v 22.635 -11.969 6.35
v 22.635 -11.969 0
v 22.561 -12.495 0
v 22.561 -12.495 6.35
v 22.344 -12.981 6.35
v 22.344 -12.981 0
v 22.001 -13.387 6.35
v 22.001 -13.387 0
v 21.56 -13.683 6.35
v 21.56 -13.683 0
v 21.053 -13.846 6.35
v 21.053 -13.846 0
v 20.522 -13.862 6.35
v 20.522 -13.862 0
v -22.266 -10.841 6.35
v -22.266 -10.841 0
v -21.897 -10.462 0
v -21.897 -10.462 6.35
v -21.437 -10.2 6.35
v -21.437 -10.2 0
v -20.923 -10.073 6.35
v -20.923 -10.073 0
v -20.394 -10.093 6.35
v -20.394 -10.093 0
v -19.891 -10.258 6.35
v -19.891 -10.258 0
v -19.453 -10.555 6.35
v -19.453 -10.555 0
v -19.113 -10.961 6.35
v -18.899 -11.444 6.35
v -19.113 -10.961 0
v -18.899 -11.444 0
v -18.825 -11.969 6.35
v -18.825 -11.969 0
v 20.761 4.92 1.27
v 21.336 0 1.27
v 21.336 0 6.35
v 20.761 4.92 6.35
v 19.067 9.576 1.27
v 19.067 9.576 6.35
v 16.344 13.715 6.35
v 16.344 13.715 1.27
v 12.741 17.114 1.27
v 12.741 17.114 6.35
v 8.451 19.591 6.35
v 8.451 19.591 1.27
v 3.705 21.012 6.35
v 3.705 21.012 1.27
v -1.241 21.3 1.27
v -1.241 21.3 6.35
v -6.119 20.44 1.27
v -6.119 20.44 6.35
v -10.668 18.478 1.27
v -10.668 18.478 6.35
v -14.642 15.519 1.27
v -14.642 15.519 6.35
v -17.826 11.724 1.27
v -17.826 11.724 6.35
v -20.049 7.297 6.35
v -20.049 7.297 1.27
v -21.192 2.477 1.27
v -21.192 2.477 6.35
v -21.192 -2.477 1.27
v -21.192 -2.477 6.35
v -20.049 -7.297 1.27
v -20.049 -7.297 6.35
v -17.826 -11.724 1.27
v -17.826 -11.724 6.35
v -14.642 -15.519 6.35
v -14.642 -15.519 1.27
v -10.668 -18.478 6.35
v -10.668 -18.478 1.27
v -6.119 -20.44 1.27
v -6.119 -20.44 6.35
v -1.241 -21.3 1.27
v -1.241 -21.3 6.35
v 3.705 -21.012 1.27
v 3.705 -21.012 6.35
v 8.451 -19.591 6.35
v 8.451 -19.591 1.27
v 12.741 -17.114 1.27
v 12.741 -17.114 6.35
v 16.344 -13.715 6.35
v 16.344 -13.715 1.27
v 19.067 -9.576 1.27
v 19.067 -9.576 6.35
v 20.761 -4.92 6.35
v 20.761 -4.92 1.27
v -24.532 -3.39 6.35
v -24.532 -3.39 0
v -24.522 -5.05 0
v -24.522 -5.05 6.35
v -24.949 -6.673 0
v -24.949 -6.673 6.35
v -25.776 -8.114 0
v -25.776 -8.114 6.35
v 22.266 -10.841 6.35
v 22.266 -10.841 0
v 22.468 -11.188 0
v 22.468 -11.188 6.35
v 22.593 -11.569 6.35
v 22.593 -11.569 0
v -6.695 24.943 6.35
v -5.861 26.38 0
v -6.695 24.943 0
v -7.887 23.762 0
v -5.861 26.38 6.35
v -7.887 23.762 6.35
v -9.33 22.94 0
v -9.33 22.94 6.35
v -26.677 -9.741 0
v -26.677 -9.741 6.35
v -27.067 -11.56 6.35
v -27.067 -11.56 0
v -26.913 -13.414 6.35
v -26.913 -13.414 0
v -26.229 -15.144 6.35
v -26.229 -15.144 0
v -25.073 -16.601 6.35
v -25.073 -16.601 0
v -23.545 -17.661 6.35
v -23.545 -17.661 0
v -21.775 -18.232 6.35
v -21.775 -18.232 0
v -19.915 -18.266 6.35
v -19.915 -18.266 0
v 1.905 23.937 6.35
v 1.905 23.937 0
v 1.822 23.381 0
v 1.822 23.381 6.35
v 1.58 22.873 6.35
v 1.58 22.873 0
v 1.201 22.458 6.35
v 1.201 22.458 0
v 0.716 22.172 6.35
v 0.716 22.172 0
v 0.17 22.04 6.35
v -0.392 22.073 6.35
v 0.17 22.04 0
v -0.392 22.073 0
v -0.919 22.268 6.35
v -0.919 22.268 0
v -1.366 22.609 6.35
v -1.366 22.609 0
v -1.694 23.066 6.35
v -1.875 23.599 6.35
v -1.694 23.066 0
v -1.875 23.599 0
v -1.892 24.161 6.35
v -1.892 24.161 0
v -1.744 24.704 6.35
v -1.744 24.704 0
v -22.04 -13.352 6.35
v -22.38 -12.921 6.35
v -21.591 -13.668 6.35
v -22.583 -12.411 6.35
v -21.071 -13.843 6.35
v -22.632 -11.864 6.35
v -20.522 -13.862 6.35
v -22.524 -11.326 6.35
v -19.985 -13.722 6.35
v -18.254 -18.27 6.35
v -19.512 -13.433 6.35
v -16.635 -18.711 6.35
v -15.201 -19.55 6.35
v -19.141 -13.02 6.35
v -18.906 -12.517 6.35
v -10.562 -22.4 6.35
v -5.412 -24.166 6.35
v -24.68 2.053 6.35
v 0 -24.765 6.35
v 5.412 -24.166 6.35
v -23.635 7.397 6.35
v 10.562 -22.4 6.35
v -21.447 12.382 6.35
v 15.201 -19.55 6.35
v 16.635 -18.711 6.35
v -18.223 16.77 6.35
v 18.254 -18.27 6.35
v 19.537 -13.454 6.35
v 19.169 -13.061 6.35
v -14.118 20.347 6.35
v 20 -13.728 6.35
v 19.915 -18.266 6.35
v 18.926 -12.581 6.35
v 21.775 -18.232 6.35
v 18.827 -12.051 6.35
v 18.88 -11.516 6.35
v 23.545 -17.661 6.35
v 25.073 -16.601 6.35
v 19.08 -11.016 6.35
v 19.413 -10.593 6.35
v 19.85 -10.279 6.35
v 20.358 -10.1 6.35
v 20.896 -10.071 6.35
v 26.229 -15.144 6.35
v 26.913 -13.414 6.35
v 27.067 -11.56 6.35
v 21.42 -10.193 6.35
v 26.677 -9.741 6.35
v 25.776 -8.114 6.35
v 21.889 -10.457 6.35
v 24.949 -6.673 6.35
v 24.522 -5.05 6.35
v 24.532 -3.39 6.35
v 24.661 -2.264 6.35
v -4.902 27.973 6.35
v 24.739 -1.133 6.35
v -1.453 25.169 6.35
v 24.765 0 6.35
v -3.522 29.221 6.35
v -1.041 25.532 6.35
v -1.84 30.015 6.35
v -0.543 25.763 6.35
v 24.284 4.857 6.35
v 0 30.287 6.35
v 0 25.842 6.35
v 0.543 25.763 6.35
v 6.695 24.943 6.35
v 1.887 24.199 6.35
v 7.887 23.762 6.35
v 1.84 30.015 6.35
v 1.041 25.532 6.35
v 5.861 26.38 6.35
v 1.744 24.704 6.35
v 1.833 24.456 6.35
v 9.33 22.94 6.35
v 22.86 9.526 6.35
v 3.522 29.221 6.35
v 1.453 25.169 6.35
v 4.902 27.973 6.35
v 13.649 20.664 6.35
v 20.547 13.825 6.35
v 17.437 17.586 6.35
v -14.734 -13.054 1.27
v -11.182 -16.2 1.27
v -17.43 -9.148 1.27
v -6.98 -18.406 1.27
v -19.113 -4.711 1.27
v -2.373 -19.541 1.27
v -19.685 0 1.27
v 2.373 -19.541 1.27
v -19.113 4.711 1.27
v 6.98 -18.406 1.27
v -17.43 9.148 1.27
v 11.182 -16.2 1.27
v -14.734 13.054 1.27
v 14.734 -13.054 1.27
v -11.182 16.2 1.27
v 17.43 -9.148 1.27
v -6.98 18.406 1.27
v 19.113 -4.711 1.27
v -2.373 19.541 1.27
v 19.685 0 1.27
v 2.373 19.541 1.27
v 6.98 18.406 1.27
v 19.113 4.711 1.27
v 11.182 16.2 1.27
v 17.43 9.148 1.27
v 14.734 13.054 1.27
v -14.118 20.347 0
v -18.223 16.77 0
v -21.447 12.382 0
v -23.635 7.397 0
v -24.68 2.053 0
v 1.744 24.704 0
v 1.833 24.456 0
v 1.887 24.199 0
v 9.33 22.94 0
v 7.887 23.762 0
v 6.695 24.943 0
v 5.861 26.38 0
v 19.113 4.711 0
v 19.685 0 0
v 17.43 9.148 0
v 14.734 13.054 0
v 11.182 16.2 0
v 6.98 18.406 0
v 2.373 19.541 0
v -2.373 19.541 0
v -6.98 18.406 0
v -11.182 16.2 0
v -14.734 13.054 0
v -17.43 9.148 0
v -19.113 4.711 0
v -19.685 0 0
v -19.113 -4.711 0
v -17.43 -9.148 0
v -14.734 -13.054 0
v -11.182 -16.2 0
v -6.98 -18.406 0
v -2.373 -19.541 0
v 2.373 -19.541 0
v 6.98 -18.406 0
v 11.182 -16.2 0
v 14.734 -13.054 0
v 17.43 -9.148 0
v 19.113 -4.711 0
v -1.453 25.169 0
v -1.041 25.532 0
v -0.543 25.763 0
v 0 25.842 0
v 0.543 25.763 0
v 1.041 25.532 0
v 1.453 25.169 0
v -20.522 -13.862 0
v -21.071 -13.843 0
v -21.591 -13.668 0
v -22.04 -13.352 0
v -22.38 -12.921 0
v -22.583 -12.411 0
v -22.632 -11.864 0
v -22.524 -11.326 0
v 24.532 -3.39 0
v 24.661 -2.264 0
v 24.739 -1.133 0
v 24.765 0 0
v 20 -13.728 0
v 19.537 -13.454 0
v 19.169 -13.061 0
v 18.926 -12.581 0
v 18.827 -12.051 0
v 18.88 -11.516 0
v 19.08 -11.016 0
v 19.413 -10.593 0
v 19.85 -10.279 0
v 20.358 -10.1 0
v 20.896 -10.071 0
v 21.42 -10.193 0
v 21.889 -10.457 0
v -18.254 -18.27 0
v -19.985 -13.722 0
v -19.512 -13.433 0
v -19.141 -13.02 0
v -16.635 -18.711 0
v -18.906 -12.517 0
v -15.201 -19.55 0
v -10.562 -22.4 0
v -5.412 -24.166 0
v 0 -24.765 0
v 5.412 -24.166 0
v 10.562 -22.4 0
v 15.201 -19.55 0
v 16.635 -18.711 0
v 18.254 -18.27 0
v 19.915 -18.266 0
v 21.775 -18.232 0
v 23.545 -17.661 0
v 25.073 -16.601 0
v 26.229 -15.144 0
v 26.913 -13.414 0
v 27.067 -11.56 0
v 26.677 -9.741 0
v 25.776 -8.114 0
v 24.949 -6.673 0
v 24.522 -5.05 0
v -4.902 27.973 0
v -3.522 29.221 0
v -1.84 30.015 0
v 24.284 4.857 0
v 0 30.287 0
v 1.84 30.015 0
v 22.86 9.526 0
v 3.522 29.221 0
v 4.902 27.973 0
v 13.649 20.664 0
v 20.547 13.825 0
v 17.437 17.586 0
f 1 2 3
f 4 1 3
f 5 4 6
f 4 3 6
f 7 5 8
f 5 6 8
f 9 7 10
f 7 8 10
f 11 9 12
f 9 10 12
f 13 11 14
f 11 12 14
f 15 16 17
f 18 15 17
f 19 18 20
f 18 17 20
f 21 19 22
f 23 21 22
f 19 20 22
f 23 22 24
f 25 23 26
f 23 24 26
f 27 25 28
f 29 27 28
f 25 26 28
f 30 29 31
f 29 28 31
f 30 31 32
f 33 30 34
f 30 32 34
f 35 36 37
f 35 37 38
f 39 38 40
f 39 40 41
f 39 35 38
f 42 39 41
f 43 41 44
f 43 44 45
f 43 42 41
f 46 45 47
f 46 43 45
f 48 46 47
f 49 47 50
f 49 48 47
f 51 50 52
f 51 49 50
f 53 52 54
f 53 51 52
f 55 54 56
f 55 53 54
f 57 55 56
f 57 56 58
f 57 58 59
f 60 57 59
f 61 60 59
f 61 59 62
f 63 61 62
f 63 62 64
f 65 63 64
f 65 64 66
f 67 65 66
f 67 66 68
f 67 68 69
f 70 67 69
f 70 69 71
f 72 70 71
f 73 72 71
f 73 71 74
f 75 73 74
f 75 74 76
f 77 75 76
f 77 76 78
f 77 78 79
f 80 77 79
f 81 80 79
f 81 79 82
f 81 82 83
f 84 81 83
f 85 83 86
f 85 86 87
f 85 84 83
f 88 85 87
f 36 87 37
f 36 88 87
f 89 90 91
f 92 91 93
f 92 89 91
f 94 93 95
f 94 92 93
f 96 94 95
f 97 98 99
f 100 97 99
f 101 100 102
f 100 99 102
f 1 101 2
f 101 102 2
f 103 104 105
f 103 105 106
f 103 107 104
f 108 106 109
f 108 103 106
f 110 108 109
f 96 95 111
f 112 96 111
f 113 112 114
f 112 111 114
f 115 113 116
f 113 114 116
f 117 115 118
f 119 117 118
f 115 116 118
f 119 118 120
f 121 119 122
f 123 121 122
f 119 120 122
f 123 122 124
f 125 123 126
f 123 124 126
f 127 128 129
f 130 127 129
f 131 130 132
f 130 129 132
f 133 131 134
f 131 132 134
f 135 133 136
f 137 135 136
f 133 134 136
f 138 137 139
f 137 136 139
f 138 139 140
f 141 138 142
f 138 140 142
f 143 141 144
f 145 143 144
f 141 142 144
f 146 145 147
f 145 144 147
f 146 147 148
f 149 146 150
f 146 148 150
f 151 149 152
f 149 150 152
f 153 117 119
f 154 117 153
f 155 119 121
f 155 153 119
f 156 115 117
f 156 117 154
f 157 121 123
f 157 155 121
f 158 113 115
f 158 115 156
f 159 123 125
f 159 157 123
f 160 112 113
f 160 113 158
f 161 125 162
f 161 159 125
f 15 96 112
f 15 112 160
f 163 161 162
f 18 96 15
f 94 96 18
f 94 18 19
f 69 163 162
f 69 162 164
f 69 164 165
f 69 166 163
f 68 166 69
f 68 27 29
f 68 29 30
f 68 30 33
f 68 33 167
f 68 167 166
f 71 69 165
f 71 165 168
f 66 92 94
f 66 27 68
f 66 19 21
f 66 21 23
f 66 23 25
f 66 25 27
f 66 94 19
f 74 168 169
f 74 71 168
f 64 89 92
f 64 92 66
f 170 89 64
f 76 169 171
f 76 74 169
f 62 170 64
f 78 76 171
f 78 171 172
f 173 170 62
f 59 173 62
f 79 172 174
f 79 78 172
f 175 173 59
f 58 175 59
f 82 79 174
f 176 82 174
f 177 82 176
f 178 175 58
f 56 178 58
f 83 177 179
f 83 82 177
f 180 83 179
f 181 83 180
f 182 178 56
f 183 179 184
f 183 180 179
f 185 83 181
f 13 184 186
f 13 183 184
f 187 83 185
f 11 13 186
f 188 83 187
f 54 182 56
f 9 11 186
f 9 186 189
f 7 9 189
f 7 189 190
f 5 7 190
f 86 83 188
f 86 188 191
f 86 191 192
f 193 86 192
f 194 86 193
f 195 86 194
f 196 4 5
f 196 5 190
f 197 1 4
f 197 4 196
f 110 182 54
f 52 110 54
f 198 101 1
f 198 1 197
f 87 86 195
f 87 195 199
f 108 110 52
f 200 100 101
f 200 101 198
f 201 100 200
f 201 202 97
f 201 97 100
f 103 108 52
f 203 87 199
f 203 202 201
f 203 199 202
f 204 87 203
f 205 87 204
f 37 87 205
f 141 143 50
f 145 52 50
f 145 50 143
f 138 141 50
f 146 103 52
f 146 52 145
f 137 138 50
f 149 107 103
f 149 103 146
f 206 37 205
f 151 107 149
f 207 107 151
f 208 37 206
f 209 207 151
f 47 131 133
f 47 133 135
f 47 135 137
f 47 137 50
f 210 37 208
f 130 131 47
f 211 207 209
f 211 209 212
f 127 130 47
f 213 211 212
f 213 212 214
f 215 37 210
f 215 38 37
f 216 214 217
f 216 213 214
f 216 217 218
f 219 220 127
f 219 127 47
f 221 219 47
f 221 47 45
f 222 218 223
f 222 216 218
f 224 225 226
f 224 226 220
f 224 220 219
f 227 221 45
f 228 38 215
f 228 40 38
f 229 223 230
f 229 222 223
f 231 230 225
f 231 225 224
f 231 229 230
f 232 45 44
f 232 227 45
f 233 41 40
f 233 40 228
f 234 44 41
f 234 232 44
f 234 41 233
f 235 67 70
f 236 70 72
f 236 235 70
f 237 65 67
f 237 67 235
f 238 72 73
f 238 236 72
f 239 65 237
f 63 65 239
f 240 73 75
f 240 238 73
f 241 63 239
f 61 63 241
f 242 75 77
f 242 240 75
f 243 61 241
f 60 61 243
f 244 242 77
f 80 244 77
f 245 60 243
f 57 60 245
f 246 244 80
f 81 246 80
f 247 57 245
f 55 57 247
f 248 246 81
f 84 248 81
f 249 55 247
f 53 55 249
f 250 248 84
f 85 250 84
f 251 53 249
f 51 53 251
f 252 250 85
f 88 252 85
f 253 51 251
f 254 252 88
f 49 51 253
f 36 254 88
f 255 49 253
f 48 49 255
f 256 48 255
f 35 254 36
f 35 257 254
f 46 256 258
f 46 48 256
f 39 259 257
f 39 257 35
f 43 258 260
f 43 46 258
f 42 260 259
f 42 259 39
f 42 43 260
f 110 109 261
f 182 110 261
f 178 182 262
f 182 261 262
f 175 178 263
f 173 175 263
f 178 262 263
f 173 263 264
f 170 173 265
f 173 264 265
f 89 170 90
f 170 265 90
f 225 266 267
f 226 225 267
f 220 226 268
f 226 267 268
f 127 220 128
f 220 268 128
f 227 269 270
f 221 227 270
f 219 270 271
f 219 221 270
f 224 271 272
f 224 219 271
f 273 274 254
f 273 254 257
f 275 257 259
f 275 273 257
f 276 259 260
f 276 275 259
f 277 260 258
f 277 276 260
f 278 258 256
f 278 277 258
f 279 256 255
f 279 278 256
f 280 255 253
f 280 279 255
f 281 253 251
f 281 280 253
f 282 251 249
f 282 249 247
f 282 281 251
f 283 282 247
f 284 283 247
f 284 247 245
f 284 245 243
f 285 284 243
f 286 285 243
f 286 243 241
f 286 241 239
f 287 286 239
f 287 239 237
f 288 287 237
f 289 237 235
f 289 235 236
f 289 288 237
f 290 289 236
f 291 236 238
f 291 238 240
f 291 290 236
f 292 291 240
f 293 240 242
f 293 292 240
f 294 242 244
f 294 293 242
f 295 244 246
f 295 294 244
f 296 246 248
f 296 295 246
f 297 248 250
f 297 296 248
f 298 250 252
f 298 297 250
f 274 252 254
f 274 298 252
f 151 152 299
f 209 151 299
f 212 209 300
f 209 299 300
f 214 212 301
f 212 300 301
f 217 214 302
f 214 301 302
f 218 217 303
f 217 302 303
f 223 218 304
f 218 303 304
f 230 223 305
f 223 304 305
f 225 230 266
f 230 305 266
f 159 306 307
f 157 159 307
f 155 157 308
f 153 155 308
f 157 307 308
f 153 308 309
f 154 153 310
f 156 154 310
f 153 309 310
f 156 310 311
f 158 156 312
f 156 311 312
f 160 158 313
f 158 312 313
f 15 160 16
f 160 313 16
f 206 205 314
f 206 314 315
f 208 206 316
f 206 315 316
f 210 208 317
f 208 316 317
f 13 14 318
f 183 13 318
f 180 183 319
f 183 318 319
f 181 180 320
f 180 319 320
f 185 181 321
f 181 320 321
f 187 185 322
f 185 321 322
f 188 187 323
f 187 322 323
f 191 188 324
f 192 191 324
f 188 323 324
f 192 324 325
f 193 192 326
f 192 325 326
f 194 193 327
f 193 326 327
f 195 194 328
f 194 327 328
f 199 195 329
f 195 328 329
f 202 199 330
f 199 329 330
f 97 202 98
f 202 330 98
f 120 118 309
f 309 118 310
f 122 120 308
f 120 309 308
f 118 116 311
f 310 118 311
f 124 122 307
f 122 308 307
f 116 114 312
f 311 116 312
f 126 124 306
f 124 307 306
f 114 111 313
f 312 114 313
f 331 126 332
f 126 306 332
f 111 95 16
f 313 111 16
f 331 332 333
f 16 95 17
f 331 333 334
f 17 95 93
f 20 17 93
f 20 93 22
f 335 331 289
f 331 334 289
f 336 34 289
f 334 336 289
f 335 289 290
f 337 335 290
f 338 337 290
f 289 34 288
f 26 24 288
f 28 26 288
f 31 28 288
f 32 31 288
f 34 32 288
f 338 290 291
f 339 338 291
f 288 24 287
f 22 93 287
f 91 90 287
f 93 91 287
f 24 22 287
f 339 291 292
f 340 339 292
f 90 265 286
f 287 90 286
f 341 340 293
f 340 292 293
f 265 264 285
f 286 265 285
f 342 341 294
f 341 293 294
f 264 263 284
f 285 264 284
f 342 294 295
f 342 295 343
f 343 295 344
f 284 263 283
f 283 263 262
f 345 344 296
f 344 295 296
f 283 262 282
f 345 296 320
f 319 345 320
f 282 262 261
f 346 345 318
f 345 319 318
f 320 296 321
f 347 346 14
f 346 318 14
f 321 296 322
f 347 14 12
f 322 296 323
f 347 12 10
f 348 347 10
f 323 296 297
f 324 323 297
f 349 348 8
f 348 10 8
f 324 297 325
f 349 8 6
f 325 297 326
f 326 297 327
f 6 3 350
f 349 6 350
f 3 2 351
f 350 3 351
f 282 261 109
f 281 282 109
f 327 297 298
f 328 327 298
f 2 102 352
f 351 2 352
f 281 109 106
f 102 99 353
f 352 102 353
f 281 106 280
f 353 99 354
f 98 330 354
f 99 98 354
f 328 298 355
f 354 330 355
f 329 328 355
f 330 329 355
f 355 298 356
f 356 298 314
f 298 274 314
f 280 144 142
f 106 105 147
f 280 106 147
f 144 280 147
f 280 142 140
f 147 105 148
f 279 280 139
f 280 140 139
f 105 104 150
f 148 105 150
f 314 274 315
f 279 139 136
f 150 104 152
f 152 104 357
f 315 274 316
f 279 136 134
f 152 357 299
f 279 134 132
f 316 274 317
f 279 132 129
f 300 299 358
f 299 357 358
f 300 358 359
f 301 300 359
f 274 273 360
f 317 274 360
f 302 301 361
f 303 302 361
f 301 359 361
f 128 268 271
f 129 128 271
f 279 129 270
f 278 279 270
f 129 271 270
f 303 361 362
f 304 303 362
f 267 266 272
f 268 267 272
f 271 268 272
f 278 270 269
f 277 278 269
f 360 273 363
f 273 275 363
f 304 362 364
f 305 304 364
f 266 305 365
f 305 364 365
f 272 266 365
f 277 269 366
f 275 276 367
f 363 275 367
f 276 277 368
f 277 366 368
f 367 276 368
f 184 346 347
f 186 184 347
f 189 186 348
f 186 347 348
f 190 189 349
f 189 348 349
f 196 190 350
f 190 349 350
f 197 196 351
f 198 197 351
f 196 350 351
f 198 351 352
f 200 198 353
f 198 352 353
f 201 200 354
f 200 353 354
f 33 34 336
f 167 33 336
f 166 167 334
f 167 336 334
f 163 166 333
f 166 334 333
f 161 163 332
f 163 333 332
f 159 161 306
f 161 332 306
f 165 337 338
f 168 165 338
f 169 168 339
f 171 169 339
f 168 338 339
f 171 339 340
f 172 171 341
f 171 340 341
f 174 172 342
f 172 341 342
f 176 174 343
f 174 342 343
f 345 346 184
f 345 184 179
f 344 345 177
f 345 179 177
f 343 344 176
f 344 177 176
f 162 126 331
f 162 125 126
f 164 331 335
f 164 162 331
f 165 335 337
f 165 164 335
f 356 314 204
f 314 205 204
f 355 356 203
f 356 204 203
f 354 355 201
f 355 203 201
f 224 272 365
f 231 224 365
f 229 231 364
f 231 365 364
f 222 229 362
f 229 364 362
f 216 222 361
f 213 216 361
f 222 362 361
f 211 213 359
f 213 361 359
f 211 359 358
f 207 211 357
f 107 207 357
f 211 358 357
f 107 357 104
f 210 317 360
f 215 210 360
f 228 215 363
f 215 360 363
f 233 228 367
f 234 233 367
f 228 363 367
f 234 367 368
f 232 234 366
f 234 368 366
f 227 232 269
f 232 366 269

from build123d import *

# Parameters (mm, degrees)
F0_R     = 21.336
F0_R_2   = 19.685
F1_DEPTH = 1.27
F2_DEPTH = 6.35
F3_R     = 6.35


with BuildPart() as f1:
    # F0 (on Top) → F1 (new body)
    with BuildSketch(Plane.XY):
        Circle(F0_R)
        Circle(F0_R_2, mode=Mode.SUBTRACT)
    extrude(amount=F1_DEPTH)

    # F0 (on Top) → F2 (join)
    with BuildSketch(Plane.XY):
        with BuildLine():
            ThreePointArc((23.9050999455, -6.4692674698), (24.5490837421, -3.2630832697), (24.765, 0))
            ThreePointArc((24.765, 0), (19.6285885254, 15.1004548773), (6.35, 23.9370575677))
            ThreePointArc((6.35, 23.9370575677), (4.0651088886, 24.4290833787), (1.7440091422, 24.703515076))
            ThreePointArc((1.7440091422, 24.703515076), (1.8643178935, 24.3286489263), (1.905, 23.9370575677))
            ThreePointArc((1.905, 23.9370575677), (-0.3915913586, 22.0727396742), (-1.7440091422, 24.703515076))
            ThreePointArc((-1.7440091422, 24.703515076), (-4.0651088886, 24.4290833787), (-6.35, 23.9370575677))
            ThreePointArc((-6.35, 23.9370575677), (-21.4471191247, 12.3825), (-23.9050999455, -6.4692674698))
            ThreePointArc((-23.9050999455, -6.4692674698), (-23.1887612414, -8.6940541227), (-22.2658761897, -10.8414013165))
            ThreePointArc((-22.2658761897, -10.8414013165), (-20.1370690632, -10.1581864481), (-18.8250999455, -11.9685287839))
            ThreePointArc((-18.8250999455, -11.9685287839), (-19.3113489683, -13.239815795), (-20.5218670475, -13.8621137596))
            ThreePointArc((-20.5218670475, -13.8621137596), (-19.1236523528, -15.735029256), (-17.5550999455, -17.4677900979))
            ThreePointArc((-17.5550999455, -17.4677900979), (0, -24.765), (17.5550999455, -17.4677900979))
            ThreePointArc((17.5550999455, -17.4677900979), (19.1236523528, -15.735029256), (20.5218670475, -13.8621137596))
            ThreePointArc((20.5218670475, -13.8621137596), (19.0803215513, -11.0160287839), (22.2658761897, -10.8414013165))
            ThreePointArc((22.2658761897, -10.8414013165), (23.1887612414, -8.6940541227), (23.9050999455, -6.4692674698))
        make_face()
        Circle(F0_R, mode=Mode.SUBTRACT)
        with BuildLine():
            ThreePointArc((1.7440091422, 24.703515076), (4.0651088886, 24.4290833787), (6.35, 23.9370575677))
            ThreePointArc((6.35, 23.9370575677), (0, 30.2870575677), (-6.35, 23.9370575677))
            ThreePointArc((-6.35, 23.9370575677), (-4.0651088886, 24.4290833787), (-1.7440091422, 24.703515076))
            ThreePointArc((-1.7440091422, 24.703515076), (0, 25.8420575677), (1.7440091422, 24.703515076))
        make_face()
        with BuildLine():
            ThreePointArc((17.5550999455, -17.4677900979), (26.2293612595, -15.1435287839), (23.9050999455, -6.4692674698))
            ThreePointArc((23.9050999455, -6.4692674698), (23.1887612414, -8.6940541227), (22.2658761897, -10.8414013165))
            ThreePointArc((22.2658761897, -10.8414013165), (22.5404422812, -11.3754979015), (22.6350999455, -11.9685287839))
            ThreePointArc((22.6350999455, -11.9685287839), (22.0013869566, -13.3872797611), (20.5218670475, -13.8621137596))
            ThreePointArc((20.5218670475, -13.8621137596), (19.1236523528, -15.735029256), (17.5550999455, -17.4677900979))
        make_face()
        with BuildLine():
            ThreePointArc((-22.2658761897, -10.8414013165), (-23.1887612414, -8.6940541227), (-23.9050999455, -6.4692674698))
            ThreePointArc((-23.9050999455, -6.4692674698), (-26.2293612595, -15.1435287839), (-17.5550999455, -17.4677900979))
            ThreePointArc((-17.5550999455, -17.4677900979), (-19.1236523528, -15.735029256), (-20.5218670475, -13.8621137596))
            ThreePointArc((-20.5218670475, -13.8621137596), (-22.3798783397, -12.9210287839), (-22.2658761897, -10.8414013165))
        make_face()
    extrude(amount=F2_DEPTH)

    # F3
    f3_edges = [f1.edges().sort_by_distance(p)[0] for p in [
        (6.35, 23.937058, 3.175),
        (-23.9051, -6.469267, 3.175),
        (17.5551, -17.46779, 3.175),
        (23.9051, -6.469267, 3.175),
        (-6.35, 23.937058, 3.175),
        (-17.5551, -17.46779, 3.175),
    ]]
    fillet(f3_edges, radius=F3_R)


solid = f1.part
